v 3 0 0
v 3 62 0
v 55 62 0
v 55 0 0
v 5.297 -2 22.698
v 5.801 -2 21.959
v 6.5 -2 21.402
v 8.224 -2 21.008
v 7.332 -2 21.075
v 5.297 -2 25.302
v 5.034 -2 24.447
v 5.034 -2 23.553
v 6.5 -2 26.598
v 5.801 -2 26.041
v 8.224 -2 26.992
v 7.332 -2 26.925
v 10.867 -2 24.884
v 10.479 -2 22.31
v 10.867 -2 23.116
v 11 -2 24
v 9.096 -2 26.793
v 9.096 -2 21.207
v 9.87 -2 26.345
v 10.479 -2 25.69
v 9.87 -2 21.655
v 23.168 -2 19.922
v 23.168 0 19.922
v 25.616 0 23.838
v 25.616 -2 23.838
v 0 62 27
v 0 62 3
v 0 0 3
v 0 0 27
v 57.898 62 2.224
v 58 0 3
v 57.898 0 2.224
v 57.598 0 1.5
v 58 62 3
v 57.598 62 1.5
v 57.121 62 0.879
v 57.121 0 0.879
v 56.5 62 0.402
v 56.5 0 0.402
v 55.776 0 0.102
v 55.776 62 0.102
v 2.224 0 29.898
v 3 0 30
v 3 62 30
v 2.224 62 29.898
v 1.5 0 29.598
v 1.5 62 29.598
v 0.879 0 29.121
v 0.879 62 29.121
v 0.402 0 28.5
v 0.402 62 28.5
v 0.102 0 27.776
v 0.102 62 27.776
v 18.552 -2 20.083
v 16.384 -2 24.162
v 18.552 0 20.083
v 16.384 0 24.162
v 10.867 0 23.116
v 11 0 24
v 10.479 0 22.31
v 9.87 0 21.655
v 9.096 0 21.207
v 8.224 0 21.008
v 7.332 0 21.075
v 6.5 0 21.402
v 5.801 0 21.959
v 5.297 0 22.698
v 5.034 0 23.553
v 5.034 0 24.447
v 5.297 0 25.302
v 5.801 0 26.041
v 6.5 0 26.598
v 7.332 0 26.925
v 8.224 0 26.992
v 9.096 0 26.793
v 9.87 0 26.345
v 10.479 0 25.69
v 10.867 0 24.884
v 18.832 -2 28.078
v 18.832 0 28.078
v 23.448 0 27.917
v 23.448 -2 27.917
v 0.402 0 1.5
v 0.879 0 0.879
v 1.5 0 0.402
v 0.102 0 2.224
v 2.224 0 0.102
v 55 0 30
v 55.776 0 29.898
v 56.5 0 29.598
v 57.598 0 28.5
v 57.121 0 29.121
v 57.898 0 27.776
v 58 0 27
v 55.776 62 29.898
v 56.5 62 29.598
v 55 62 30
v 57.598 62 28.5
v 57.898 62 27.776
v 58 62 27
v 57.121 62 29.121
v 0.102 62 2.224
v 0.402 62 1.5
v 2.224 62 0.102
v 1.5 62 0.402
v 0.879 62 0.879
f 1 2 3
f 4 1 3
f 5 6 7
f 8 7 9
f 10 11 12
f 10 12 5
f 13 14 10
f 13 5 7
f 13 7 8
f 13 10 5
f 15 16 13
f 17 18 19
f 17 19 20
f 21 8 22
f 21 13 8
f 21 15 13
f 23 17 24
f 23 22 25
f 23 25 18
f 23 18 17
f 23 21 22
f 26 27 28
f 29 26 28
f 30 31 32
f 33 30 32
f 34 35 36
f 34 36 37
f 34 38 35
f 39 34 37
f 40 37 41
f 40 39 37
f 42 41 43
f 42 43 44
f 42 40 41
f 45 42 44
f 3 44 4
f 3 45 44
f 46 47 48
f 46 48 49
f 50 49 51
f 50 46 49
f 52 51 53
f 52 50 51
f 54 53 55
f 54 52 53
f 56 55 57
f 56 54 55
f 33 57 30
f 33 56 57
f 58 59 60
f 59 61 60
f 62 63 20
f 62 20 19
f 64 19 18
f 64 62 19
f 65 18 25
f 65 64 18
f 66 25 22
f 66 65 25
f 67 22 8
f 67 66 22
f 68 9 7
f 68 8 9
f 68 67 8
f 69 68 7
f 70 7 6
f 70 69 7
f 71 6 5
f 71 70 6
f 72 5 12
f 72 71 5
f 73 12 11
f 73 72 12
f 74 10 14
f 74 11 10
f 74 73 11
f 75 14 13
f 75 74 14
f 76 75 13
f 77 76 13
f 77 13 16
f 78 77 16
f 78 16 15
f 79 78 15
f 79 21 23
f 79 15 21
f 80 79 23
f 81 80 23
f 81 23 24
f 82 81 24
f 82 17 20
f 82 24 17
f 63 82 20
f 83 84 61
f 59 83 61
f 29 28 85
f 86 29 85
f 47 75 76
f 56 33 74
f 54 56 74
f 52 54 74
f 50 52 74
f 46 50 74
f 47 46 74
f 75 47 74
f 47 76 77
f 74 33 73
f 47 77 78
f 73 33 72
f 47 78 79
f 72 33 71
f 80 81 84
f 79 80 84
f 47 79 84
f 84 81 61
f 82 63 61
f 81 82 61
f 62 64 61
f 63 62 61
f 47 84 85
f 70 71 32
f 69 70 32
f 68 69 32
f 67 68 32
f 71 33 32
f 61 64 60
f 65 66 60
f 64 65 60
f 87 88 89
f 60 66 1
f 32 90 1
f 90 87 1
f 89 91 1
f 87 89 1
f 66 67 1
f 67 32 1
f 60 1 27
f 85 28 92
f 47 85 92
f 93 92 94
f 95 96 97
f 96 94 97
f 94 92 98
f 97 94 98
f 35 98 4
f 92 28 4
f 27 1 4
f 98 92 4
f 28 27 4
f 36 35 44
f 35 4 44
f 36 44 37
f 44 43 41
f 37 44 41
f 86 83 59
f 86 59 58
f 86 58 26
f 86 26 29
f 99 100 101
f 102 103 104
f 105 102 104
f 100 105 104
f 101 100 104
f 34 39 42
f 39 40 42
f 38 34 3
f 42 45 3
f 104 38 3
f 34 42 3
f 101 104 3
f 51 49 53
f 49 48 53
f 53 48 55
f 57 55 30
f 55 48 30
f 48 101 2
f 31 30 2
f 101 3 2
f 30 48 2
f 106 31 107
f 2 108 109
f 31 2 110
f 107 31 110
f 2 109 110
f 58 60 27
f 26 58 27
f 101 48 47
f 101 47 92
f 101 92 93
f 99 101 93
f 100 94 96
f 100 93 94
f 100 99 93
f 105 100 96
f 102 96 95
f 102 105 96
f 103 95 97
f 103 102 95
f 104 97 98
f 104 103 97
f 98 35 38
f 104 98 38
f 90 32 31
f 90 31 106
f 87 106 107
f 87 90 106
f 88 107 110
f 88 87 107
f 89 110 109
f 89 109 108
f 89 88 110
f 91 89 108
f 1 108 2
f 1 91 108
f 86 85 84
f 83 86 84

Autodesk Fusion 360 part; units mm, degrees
sketch "Esquisse1" plane through (0, 0, 0) normal (0, 0, 1) x (1, 0, 0)
  line L0 (0, 0) -> (58, 0)
  line L1 (58, 0) -> (58, 62)
  line L2 (58, 62) -> (0, 62)
  line L3 (0, 62) -> (0, 0)
  dimension "d1" = 58
  dimension "d2" = 62
extrude "Extrusion1" add sketch "Esquisse1" along normal blind 30
fillet "Congé1" radius 3 4 edges at (58, 31, 30) (58, 31, 0) (0, 31, 30) (0, 31, 0)
sketch "Esquisse2" plane through (0, 0, 0) normal (0, -1, 0) x (1, 0, 0)
  arc A0 (0, 3) -> (3, 0) centre (3, 3) ccw
  line L0 (3, 0) -> (55, 0)
  arc A1 (55, 0) -> (58, 3) centre (55, 3) ccw
  line L1 (58, 3) -> (58, 27)
  arc A2 (58, 27) -> (55, 30) centre (55, 27) ccw
  line L2 (55, 30) -> (3, 30)
  arc A3 (3, 30) -> (0, 27) centre (3, 27) ccw
  line L3 (0, 27) -> (0, 3)
  circle A4 centre (8, 24) radius 3
  dimension "d7" = 6
  dimension "d8" = 6
  dimension "d9" = 8
sketch "Esquisse3" plane through (0, 0, 0) normal (0, -1, 0) x (1, 0, 0)
  line L0 (18.832, 28.0784) -> (16.384, 24.1616)
  line L1 (16.384, 24.1616) -> (18.552, 20.0833)
  line L2 (18.552, 20.0833) -> (23.168, 19.9216)
  line L3 (23.168, 19.9216) -> (25.616, 23.8384)
  line L4 (25.616, 23.8384) -> (23.448, 27.9167)
  line L5 (23.448, 27.9167) -> (18.832, 28.0784)
  line L6 (55, 30) -> (3, 30)
  line L7 (0, 27) -> (0, 3)
  point P0 (21, 24)
  dimension "d10" = 8
  dimension "d11" = 6
  dimension "d12" = 21
extrude "Extrusion2" add sketch "Esquisse2" sketch "Esquisse3" along normal blind 2 contours A4 of sketch 2
